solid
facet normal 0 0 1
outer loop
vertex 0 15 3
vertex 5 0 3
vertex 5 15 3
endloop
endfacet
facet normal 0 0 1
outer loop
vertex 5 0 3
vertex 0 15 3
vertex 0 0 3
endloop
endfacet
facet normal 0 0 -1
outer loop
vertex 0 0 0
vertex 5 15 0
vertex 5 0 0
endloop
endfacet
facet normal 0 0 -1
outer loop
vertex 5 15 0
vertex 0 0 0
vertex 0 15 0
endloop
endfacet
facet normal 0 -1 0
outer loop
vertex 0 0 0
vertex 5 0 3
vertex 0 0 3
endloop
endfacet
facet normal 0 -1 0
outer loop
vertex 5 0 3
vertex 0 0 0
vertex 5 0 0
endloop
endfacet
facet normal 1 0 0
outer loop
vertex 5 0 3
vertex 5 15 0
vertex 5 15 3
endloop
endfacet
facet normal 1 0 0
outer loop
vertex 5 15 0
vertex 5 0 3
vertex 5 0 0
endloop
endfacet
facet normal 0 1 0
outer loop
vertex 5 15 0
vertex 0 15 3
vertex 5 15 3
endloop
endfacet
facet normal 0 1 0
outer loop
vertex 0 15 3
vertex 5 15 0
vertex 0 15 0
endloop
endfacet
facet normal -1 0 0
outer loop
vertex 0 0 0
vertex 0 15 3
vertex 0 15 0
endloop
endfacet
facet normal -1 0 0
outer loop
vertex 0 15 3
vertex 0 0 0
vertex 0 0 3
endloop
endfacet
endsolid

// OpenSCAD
// Generated by SolidPython 1.0.1 on 2020-07-29 00:46:54


cube(size = [5, 15, 3]);
/***********************************************
*********      SolidPython code:      **********
************************************************
 
# import packages: SolidPython
from solid import *
from solid.utils import *
from itertools import chain, combinations, permutations


class Resize:

    def __init__(self, scad_file):
        self.scad_file = scad_file
        #self.scad_file = import_scad(scad_file)
        # cone/cylinder param:
        self.r1 = 0
        self.r2 = 0
        self.h = 0
        # rectangular prism param:
        self.w = 0
        self.l = 0
        # ellipse param:
        self.r = 0

    # import OpenScad code (file name corresponds to shape)


    # classify shape + parameters
    def assign(self, param1, param2, param3):
        if self.scad_file == 'cone.scad':
            self.r1 = param1
            self.r2 = param2
            self.h = param3
        elif self.scad_file == 'cylinder.scad':
            self.r1 = param1
            self.r2 = param2
            self.h = param3
        elif self.scad_file == 'rectangularPrism.scad':
            self.h = param1
            self.l = param2
            self.w = param3
        else:
            self.r = param1
            self.h = param2

    # resize parameters
    def iterate(self):
        x = range(3, 20, 2)
        i = 1
        if self.scad_file == 'cone.scad':
            tempList = list(permutations(x, 2))
            for temp in tempList:
                param1 = temp[0]
                param2 = temp[1]
                filepath = 'produced_scad_files/' + 'cone' + str(param1) + '_' + str(param2) + '_' + '.scad'
                scad_render_to_file(cylinder(h=param1, r1=param2, r2=0), filepath)

        elif self.scad_file == 'cylinder.scad':
            tempList = list(permutations(x, 3))
            for temp in tempList:
                param1 = temp[0]
                param2 = temp[1]
                filepath = 'produced_scad_files/' + 'cylinder' + str(param1) + '_' + str(param2) + '_' + '.scad'
                scad_render_to_file(cylinder(h=param1, r1=param2, r2=param2), filepath)

        elif self.scad_file == 'rectangularPrism.scad':
            tempList = list(permutations(x, 3))
            for temp in tempList:
                param1 = temp[0]
                param2 = temp[1]
                param3 = temp[2]
                filepath = 'produced_scad_files/' + 'rectangularPrism' + str(param1) + '_' + str(param2) + '_' + str(
                    param3) + '.scad'
                scad_render_to_file(cube(size=(param1, param2, param3)), filepath)

        elif self.scad_file == 'ellipse.scad':
            tempList = list(permutations(x, 4))
            for temp in tempList:
                param1 = temp[0]
                param2 = temp[1]
                param3 = temp[2]
                param4 = temp[3]
                filepath = 'produced_scad_files/' + 'ellipse' + str(param1) + '_' + str(param2) + '_' + str(param3) + '_' + str(param4) + '.scad'
                scad_render_to_file(scale([param1, param2, param3])(sphere(r=param4)), filepath)

    def render_to_scadfile(self):
        scad_render_to_file(scad, 'example.scad') 
 
************************************************/
